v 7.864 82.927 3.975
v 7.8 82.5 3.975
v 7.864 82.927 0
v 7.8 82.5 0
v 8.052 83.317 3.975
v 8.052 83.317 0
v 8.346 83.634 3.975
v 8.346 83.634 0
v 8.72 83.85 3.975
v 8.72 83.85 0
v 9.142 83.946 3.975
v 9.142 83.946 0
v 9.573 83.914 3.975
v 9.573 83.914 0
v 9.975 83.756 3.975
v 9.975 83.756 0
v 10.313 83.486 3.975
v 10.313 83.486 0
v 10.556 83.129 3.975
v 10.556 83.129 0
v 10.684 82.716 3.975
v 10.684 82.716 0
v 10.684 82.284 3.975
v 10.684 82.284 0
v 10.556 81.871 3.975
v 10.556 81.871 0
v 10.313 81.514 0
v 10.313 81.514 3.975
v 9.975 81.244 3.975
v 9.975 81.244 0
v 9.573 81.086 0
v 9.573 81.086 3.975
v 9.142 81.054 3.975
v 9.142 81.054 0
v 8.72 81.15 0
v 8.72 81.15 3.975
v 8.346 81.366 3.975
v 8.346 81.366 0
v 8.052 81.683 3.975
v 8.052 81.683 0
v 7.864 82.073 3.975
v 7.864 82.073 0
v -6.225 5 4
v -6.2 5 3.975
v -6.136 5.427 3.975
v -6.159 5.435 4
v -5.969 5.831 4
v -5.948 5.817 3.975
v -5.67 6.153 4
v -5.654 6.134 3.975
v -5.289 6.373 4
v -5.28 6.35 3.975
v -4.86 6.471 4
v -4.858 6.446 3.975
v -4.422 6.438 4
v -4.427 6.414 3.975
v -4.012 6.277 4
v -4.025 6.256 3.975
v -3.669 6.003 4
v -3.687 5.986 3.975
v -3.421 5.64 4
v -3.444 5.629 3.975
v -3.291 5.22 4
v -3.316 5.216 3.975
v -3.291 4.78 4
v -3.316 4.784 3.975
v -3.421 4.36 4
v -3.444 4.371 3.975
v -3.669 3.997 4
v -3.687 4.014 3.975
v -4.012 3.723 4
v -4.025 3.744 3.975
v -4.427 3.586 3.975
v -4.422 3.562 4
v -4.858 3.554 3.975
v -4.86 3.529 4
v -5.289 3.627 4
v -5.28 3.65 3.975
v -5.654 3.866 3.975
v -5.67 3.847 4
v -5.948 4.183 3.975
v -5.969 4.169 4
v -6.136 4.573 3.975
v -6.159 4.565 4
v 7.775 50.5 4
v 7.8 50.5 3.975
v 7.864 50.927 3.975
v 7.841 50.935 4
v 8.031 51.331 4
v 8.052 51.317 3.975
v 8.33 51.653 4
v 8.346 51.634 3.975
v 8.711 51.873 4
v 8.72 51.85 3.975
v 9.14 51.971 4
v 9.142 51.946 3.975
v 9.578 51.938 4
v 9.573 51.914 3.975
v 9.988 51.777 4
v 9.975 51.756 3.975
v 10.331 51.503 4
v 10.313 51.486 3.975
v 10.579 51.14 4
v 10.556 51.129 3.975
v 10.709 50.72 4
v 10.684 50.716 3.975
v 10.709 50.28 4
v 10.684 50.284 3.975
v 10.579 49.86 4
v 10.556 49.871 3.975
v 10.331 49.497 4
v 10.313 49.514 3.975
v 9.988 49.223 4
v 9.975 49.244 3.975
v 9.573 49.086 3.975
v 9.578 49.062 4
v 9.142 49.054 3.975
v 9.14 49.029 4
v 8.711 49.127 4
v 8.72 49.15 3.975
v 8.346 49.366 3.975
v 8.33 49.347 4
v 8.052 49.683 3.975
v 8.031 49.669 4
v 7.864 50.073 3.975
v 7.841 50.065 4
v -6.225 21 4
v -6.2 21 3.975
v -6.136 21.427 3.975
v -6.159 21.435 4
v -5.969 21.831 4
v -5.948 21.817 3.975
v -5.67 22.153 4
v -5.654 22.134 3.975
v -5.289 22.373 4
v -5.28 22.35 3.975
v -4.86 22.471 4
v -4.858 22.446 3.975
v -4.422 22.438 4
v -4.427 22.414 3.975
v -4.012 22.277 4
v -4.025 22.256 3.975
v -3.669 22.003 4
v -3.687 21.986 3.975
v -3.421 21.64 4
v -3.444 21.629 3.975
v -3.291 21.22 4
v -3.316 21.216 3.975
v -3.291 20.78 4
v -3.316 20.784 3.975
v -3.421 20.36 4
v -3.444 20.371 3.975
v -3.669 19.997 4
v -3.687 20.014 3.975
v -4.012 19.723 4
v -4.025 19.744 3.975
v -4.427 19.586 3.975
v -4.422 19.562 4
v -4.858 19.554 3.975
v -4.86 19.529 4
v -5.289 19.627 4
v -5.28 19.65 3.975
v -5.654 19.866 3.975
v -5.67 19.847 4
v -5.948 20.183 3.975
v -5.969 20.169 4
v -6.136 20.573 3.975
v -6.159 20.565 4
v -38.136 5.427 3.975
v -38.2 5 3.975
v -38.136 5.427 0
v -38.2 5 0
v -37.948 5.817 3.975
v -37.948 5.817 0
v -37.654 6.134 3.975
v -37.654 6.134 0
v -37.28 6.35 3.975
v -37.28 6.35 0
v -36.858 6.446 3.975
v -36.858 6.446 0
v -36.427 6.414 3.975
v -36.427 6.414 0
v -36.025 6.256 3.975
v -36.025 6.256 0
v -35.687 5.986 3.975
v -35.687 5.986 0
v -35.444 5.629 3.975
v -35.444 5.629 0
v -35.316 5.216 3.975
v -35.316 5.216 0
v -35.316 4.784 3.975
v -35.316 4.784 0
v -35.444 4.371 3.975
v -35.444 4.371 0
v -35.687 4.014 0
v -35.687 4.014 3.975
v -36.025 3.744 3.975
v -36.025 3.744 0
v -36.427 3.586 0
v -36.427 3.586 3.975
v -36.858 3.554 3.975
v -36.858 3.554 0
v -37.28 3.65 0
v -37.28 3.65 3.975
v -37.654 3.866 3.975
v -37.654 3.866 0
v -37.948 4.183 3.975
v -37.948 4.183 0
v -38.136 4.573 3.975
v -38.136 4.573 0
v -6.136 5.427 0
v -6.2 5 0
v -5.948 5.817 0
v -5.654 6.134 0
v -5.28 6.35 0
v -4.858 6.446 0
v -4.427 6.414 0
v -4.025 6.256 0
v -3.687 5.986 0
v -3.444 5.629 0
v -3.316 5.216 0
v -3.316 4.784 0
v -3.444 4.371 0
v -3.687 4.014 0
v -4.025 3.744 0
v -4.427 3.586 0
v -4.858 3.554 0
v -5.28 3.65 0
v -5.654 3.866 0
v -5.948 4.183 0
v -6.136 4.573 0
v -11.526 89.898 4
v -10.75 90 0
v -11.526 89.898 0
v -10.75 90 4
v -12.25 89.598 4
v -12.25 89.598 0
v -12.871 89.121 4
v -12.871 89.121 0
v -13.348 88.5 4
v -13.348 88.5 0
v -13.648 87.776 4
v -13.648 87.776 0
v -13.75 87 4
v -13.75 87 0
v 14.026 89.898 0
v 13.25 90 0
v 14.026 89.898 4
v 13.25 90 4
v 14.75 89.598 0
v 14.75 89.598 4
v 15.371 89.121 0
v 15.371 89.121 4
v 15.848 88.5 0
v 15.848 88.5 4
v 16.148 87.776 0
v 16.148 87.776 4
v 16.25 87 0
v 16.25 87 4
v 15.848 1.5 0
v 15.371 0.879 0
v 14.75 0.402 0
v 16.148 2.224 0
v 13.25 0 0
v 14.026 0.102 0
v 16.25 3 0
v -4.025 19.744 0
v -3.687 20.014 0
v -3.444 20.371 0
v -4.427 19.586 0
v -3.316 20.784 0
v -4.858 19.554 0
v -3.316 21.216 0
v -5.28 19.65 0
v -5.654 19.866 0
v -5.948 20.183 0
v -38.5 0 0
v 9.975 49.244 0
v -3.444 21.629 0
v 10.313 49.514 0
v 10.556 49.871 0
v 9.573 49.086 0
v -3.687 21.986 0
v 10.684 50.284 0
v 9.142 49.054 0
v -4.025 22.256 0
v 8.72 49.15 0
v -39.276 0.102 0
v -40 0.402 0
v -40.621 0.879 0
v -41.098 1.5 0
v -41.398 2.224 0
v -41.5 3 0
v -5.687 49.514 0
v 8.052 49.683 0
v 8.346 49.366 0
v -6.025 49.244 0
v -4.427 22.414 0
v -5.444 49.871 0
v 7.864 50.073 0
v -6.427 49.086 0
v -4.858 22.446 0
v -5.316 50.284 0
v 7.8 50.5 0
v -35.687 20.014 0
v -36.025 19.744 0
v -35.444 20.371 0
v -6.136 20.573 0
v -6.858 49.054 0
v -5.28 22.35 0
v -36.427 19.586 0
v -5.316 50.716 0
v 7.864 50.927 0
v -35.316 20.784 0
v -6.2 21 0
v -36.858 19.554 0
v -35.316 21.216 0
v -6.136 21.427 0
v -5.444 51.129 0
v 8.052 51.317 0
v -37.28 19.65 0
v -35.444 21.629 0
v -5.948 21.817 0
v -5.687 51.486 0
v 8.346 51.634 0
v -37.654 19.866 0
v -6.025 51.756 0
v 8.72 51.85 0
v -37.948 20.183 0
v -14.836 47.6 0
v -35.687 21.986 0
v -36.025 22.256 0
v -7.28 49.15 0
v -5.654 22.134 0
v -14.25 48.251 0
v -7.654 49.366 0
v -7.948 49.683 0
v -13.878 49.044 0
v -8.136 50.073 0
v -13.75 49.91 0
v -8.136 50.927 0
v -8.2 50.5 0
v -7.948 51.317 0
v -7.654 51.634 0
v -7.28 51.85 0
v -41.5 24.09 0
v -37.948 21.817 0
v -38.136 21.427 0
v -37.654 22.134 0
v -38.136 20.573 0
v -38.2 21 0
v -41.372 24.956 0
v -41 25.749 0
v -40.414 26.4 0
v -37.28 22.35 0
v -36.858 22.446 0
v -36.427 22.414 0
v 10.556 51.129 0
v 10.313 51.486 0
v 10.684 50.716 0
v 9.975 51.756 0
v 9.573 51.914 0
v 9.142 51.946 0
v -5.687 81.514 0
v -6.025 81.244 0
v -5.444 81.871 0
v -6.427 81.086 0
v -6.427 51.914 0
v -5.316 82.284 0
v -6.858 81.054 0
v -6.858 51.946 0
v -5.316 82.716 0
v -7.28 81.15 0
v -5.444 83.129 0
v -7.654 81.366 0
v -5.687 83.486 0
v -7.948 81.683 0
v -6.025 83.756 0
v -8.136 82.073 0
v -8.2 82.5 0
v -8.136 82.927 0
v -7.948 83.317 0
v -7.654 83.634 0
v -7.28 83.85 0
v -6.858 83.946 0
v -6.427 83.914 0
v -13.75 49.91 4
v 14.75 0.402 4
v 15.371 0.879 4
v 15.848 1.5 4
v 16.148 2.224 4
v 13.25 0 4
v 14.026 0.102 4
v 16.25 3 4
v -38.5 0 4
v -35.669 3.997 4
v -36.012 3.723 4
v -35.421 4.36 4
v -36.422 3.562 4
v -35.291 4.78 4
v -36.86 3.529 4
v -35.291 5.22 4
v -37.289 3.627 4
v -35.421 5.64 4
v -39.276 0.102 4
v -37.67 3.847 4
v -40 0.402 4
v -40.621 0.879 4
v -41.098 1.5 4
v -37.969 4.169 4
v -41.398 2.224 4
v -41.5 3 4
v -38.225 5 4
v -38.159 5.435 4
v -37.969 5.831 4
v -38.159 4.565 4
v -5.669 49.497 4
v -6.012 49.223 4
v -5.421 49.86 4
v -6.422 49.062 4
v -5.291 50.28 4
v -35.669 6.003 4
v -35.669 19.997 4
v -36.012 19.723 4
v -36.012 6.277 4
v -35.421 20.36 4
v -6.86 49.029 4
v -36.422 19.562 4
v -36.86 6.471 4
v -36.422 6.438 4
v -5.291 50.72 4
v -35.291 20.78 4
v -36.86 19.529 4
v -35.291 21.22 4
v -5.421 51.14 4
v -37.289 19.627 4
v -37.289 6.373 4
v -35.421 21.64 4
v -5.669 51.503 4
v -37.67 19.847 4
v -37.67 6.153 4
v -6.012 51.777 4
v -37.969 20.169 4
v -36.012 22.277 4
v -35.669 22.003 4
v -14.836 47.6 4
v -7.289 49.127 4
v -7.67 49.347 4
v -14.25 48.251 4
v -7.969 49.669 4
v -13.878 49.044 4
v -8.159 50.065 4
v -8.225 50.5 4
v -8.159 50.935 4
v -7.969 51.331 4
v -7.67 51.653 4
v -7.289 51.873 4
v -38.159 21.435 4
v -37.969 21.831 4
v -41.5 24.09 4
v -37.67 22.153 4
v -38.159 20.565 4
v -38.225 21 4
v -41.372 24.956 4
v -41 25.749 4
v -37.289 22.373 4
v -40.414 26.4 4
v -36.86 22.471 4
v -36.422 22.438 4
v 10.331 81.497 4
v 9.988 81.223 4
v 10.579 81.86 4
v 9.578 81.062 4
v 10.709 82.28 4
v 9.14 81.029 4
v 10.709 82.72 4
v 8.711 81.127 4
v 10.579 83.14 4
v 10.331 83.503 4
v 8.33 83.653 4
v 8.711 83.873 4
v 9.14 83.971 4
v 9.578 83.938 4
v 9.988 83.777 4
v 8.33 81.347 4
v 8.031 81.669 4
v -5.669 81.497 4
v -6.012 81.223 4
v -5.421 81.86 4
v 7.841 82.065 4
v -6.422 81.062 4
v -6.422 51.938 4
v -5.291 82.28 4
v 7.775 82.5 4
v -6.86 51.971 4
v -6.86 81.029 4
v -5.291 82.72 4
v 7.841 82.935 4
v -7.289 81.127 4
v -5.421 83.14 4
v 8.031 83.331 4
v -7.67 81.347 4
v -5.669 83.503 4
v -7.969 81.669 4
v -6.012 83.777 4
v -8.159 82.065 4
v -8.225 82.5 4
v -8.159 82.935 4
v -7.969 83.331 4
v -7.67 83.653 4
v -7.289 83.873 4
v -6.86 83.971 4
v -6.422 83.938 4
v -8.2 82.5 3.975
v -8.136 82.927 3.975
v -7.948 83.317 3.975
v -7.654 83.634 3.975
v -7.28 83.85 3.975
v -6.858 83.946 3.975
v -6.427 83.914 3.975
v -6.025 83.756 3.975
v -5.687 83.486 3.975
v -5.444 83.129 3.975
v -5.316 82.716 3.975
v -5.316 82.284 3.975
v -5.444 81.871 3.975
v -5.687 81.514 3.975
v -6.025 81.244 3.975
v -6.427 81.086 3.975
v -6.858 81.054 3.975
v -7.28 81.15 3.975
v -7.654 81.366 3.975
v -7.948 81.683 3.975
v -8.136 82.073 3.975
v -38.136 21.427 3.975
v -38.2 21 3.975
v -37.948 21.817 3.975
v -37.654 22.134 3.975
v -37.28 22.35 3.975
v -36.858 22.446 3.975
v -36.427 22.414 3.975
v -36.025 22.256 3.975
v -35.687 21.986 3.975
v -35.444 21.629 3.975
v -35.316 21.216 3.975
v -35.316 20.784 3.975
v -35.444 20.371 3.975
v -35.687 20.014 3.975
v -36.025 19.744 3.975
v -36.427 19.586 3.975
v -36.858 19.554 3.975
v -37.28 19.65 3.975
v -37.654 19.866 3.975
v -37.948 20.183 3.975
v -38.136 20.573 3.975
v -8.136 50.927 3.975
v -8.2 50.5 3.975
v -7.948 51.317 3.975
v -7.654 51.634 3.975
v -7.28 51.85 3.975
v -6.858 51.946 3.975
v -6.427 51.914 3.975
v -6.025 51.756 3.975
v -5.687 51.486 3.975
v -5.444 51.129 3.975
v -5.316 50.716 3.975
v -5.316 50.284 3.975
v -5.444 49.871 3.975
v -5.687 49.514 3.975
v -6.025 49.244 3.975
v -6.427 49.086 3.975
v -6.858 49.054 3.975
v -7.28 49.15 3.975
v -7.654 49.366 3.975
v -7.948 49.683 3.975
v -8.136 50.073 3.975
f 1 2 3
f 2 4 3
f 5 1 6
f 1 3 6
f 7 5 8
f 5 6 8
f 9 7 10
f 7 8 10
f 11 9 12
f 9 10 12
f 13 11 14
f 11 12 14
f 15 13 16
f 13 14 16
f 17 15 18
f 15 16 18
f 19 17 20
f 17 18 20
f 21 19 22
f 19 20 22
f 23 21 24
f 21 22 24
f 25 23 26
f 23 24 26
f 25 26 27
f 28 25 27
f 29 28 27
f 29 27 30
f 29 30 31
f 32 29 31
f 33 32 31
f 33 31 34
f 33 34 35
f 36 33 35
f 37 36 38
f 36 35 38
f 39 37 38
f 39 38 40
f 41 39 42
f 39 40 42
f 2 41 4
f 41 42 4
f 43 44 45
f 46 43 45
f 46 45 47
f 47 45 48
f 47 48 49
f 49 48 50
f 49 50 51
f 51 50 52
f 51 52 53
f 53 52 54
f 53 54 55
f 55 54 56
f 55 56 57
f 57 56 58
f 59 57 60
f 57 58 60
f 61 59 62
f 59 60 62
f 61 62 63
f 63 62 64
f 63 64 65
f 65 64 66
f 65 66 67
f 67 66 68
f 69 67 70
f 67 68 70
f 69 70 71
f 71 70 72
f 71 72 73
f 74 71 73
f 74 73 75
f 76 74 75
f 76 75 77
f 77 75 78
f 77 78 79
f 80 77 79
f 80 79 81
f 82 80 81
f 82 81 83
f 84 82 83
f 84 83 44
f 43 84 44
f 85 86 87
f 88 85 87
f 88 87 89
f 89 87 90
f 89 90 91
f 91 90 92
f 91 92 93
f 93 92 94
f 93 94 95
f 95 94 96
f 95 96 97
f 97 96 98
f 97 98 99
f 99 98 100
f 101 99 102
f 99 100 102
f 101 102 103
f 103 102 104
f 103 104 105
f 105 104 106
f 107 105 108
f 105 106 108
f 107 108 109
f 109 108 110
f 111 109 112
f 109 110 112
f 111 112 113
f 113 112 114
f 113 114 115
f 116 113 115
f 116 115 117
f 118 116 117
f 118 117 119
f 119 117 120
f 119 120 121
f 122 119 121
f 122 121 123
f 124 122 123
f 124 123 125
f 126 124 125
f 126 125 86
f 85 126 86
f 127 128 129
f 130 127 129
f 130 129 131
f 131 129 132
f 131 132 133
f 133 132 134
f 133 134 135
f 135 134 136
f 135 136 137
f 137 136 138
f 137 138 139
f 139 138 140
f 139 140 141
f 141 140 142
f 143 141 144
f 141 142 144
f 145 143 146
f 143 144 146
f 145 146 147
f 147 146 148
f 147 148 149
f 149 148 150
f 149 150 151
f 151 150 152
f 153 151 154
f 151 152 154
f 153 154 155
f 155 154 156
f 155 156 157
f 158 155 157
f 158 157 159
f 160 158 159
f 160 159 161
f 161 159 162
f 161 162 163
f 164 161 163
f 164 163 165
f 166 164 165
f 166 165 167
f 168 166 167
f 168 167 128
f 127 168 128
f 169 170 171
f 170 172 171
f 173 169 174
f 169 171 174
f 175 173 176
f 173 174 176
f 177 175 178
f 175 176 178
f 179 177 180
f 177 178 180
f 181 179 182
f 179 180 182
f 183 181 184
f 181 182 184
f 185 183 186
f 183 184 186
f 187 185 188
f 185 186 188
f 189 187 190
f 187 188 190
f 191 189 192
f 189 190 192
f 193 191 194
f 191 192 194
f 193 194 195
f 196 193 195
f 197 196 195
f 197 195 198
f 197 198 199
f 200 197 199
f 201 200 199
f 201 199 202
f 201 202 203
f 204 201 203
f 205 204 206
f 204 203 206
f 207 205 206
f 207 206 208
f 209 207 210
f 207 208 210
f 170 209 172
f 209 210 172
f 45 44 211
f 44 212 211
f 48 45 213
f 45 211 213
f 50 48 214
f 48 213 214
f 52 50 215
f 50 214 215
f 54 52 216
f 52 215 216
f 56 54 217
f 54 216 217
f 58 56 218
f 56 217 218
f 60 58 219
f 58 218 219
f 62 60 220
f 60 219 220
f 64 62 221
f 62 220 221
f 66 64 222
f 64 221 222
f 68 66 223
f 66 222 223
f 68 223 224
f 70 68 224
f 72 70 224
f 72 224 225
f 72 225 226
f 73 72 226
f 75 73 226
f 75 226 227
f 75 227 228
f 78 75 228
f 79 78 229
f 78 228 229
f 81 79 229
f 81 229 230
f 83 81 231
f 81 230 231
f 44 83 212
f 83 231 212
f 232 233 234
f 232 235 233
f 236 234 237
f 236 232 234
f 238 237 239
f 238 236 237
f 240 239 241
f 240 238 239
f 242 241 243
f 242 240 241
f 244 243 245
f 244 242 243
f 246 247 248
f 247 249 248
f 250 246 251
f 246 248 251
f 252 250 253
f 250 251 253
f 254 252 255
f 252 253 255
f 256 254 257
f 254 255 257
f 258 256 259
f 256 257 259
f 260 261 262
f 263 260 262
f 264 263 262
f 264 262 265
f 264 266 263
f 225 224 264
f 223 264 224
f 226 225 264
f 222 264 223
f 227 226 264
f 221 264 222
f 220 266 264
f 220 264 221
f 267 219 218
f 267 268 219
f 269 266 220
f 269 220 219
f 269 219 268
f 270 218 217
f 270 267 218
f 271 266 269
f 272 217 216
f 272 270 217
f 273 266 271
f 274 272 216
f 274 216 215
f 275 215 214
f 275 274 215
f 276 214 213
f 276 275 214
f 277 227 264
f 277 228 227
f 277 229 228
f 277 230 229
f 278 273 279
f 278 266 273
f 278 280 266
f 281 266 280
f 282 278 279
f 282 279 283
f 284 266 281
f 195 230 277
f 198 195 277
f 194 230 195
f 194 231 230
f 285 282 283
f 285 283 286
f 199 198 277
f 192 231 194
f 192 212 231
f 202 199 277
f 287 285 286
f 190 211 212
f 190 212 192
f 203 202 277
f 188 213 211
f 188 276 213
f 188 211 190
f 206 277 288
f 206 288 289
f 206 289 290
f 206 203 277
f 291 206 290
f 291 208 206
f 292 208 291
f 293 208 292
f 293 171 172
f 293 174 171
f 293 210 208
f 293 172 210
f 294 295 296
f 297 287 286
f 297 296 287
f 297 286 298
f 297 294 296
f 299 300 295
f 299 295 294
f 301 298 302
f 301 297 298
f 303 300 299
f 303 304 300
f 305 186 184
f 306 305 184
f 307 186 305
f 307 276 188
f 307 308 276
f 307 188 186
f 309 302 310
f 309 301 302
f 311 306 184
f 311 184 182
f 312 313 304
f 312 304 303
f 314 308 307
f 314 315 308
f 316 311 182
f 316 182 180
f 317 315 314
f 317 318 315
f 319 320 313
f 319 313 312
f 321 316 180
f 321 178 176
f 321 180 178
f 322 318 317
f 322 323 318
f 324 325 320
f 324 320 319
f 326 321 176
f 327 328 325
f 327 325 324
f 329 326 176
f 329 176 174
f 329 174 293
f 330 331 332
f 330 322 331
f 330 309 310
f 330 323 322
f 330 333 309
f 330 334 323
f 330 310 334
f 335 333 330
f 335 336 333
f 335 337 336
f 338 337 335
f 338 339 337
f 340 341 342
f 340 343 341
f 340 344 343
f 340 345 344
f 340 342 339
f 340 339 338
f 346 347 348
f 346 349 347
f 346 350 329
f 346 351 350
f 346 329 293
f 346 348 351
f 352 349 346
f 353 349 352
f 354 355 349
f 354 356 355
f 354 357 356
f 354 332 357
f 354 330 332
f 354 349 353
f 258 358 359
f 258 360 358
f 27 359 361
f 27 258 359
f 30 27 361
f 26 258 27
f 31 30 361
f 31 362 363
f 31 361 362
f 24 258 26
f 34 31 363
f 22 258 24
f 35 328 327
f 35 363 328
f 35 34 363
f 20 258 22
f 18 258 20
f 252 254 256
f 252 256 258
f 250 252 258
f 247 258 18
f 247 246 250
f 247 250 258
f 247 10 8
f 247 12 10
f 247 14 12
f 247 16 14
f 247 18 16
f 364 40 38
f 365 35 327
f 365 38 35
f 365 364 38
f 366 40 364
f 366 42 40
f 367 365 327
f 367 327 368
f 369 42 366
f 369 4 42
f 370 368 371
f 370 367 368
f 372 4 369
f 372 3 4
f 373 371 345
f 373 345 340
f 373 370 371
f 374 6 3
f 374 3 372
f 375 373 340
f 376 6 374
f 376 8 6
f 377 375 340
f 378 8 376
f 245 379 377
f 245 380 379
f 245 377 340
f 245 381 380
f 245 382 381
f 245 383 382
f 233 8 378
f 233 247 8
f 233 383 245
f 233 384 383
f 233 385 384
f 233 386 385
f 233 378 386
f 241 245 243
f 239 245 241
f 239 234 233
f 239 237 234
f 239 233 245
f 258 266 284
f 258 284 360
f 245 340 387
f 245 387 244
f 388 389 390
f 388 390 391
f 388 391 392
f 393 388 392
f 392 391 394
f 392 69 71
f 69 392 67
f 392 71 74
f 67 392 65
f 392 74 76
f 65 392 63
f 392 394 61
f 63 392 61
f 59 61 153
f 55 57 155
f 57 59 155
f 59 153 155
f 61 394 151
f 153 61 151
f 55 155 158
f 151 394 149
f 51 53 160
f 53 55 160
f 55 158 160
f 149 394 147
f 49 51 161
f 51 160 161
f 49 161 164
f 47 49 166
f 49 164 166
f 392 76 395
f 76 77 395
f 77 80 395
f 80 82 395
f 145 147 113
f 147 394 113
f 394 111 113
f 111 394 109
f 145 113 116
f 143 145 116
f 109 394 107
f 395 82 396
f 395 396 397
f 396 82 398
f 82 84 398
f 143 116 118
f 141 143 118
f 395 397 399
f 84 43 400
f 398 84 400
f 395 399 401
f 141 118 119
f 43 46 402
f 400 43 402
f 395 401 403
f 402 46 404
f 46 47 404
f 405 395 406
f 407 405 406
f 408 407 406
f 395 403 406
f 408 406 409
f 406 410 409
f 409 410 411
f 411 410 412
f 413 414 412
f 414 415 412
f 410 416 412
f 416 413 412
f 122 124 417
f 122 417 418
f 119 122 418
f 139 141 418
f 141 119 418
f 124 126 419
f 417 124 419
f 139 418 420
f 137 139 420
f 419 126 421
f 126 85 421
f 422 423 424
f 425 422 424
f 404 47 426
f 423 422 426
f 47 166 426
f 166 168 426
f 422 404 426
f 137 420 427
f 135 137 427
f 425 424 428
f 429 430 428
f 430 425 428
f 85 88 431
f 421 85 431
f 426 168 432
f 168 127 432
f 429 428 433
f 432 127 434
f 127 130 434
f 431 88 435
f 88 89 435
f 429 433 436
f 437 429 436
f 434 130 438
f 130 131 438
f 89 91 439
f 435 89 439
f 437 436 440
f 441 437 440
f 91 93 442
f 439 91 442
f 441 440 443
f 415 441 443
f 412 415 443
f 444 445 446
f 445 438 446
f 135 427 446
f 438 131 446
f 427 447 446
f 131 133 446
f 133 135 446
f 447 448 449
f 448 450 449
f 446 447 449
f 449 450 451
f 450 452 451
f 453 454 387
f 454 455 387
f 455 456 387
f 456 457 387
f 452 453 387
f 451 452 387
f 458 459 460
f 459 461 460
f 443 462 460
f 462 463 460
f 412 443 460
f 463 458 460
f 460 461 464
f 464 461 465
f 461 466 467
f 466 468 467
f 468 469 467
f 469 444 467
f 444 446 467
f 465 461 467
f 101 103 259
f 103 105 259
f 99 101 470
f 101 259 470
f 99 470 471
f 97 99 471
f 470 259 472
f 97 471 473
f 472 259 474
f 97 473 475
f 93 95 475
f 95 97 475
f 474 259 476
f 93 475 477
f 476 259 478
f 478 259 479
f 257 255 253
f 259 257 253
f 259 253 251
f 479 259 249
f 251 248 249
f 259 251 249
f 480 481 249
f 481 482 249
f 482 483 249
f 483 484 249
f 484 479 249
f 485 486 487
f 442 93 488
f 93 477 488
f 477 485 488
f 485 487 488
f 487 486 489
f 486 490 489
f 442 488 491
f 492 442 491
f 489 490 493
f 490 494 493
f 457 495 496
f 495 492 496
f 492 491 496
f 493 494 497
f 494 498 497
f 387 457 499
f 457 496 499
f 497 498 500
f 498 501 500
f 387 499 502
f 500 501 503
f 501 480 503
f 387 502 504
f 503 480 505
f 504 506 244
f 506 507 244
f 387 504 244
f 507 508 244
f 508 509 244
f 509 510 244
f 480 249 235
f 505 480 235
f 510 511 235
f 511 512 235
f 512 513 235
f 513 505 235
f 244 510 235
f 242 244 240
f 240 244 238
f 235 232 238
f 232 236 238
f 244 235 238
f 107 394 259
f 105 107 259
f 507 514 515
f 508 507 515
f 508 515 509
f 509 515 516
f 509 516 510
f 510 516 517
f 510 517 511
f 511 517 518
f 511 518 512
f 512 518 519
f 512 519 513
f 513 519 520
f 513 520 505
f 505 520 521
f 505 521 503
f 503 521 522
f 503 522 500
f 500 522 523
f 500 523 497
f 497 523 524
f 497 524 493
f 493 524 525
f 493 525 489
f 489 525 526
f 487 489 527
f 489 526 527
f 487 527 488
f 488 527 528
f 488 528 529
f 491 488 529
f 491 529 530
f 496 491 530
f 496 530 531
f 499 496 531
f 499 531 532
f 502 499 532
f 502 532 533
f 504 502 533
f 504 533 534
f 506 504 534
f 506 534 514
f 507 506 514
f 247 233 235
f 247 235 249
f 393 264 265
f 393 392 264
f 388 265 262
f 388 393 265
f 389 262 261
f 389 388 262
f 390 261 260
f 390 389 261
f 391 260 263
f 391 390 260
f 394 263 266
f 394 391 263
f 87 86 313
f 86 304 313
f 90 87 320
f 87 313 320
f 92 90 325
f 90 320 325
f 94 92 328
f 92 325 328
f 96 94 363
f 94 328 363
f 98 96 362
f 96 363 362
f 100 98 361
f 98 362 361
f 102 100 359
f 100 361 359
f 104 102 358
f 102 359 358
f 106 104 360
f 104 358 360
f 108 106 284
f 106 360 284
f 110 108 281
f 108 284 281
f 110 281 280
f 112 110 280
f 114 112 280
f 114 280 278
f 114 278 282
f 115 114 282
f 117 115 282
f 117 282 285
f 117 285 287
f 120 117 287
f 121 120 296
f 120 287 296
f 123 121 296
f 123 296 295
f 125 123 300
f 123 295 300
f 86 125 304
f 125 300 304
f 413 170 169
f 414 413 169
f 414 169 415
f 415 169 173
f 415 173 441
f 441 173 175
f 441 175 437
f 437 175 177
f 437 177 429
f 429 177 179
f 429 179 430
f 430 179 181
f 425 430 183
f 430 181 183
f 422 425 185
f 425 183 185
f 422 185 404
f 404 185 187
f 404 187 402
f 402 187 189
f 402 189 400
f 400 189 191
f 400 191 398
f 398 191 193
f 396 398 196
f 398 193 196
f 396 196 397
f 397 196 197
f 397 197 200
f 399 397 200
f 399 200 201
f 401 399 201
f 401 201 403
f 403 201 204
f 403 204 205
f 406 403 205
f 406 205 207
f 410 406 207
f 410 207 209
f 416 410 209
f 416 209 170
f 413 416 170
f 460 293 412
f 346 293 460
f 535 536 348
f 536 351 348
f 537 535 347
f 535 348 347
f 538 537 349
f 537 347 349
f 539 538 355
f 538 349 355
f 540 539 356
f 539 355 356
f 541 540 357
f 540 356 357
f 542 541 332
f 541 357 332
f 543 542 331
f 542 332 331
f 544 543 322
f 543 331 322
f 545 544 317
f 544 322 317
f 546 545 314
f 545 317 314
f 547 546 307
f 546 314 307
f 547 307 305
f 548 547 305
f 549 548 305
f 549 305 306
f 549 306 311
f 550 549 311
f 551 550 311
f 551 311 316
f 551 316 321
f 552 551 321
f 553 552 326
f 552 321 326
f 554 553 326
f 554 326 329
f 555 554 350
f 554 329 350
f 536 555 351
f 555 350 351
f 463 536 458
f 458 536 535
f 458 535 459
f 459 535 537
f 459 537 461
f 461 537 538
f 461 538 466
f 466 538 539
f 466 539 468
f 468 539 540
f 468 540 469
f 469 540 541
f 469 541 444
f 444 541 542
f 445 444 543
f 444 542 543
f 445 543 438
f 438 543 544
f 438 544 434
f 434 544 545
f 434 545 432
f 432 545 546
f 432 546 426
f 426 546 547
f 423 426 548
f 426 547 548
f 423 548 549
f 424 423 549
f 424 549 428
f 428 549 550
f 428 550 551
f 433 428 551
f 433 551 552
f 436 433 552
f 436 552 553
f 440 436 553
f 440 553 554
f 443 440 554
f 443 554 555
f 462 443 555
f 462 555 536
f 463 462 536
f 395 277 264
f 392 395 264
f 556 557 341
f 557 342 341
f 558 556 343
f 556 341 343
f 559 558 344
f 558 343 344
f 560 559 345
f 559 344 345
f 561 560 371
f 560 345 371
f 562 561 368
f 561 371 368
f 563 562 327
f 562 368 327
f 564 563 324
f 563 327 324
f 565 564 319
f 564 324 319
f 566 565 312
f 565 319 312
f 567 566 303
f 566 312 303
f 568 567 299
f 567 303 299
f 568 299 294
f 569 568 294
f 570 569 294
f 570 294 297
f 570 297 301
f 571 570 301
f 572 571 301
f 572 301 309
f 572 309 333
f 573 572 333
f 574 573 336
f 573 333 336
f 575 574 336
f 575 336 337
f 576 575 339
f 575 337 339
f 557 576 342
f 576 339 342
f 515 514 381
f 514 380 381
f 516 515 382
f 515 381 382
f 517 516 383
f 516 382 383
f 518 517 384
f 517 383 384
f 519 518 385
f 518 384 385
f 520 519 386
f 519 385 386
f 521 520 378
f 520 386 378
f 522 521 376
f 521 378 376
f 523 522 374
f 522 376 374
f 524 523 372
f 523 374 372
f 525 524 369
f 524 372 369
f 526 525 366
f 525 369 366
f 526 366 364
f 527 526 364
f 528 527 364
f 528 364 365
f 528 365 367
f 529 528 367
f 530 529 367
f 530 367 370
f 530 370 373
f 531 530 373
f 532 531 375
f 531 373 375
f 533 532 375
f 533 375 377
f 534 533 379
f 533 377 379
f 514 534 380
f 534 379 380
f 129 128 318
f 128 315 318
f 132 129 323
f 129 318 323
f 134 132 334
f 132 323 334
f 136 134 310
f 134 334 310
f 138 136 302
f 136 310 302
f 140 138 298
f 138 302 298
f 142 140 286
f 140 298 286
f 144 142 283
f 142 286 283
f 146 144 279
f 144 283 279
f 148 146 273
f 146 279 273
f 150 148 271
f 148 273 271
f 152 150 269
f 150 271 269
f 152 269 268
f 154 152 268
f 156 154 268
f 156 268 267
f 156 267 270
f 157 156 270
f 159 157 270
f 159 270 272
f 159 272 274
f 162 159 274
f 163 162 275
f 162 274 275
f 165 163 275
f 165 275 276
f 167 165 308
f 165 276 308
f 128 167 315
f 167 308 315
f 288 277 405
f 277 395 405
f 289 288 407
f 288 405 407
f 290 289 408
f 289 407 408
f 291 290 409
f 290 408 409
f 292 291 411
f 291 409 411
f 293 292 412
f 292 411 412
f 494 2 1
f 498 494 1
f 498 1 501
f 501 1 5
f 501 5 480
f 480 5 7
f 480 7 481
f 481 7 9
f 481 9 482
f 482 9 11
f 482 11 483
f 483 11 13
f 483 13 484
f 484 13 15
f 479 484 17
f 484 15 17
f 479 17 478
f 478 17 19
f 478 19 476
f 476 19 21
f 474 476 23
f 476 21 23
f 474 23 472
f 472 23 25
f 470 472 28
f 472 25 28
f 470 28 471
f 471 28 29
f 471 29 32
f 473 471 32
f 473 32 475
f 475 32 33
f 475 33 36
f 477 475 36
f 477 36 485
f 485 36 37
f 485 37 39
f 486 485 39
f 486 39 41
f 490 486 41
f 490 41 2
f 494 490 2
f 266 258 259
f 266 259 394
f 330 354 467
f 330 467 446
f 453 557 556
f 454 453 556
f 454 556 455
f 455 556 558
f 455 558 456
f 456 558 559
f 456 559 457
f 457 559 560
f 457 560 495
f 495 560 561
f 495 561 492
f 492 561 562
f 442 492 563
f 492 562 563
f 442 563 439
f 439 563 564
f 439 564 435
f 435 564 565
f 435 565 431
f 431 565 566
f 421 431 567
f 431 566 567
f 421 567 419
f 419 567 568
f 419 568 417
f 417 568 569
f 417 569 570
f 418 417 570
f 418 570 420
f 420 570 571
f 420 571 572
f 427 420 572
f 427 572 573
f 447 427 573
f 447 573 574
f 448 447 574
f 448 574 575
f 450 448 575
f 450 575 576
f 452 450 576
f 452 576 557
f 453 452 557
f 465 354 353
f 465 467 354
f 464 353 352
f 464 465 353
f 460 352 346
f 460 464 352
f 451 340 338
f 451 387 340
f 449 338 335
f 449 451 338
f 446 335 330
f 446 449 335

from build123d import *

# Parameters (mm, degrees)
EXTRUDE_1_DEPTH                = 4
HOLE_WIZARD_M2_5_1_D           = 2.9
HOLE_WIZARD_M2_5_1_CSINK_D     = 2.95
HOLE_WIZARD_M2_5_1_CSINK_ANGLE = 90
FILLET_2_R                     = 3


with BuildPart() as part:
    # 草图1 → 凸台-拉伸1 (new body)
    with BuildSketch(Plane.XY):
        Polygon((0, 0), (-41.5, 0), (-41.5, 25.5), (-13.75, 48.5), (-13.75, 90), (16.25, 90), (16.25, 0), align=None)
    extrude(amount=EXTRUDE_1_DEPTH)

    # M2.5 间隙孔1 (through all)
    with Locations(Plane.XY.offset(4)):
        with Locations((9.25, 50.5), (-36.75, 5), (-36.75, 21), (-4.75, 5), (-4.75, 21), (-6.75, 82.5), (9.25, 82.5), (-6.75, 50.5)):
            CounterSinkHole(HOLE_WIZARD_M2_5_1_D / 2, HOLE_WIZARD_M2_5_1_CSINK_D / 2, counter_sink_angle=HOLE_WIZARD_M2_5_1_CSINK_ANGLE)

    # 圆角2
    fillet_2_edges = [part.edges().sort_by_distance(p)[0] for p in [
        (-41.5, 0, 2),
        (-41.5, 25.5, 2),
        (-13.75, 48.5, 2),
        (-13.75, 90, 2),
        (16.25, 90, 2),
        (16.25, 0, 2),
    ]]
    fillet(fillet_2_edges, radius=FILLET_2_R)


solid = part.part
